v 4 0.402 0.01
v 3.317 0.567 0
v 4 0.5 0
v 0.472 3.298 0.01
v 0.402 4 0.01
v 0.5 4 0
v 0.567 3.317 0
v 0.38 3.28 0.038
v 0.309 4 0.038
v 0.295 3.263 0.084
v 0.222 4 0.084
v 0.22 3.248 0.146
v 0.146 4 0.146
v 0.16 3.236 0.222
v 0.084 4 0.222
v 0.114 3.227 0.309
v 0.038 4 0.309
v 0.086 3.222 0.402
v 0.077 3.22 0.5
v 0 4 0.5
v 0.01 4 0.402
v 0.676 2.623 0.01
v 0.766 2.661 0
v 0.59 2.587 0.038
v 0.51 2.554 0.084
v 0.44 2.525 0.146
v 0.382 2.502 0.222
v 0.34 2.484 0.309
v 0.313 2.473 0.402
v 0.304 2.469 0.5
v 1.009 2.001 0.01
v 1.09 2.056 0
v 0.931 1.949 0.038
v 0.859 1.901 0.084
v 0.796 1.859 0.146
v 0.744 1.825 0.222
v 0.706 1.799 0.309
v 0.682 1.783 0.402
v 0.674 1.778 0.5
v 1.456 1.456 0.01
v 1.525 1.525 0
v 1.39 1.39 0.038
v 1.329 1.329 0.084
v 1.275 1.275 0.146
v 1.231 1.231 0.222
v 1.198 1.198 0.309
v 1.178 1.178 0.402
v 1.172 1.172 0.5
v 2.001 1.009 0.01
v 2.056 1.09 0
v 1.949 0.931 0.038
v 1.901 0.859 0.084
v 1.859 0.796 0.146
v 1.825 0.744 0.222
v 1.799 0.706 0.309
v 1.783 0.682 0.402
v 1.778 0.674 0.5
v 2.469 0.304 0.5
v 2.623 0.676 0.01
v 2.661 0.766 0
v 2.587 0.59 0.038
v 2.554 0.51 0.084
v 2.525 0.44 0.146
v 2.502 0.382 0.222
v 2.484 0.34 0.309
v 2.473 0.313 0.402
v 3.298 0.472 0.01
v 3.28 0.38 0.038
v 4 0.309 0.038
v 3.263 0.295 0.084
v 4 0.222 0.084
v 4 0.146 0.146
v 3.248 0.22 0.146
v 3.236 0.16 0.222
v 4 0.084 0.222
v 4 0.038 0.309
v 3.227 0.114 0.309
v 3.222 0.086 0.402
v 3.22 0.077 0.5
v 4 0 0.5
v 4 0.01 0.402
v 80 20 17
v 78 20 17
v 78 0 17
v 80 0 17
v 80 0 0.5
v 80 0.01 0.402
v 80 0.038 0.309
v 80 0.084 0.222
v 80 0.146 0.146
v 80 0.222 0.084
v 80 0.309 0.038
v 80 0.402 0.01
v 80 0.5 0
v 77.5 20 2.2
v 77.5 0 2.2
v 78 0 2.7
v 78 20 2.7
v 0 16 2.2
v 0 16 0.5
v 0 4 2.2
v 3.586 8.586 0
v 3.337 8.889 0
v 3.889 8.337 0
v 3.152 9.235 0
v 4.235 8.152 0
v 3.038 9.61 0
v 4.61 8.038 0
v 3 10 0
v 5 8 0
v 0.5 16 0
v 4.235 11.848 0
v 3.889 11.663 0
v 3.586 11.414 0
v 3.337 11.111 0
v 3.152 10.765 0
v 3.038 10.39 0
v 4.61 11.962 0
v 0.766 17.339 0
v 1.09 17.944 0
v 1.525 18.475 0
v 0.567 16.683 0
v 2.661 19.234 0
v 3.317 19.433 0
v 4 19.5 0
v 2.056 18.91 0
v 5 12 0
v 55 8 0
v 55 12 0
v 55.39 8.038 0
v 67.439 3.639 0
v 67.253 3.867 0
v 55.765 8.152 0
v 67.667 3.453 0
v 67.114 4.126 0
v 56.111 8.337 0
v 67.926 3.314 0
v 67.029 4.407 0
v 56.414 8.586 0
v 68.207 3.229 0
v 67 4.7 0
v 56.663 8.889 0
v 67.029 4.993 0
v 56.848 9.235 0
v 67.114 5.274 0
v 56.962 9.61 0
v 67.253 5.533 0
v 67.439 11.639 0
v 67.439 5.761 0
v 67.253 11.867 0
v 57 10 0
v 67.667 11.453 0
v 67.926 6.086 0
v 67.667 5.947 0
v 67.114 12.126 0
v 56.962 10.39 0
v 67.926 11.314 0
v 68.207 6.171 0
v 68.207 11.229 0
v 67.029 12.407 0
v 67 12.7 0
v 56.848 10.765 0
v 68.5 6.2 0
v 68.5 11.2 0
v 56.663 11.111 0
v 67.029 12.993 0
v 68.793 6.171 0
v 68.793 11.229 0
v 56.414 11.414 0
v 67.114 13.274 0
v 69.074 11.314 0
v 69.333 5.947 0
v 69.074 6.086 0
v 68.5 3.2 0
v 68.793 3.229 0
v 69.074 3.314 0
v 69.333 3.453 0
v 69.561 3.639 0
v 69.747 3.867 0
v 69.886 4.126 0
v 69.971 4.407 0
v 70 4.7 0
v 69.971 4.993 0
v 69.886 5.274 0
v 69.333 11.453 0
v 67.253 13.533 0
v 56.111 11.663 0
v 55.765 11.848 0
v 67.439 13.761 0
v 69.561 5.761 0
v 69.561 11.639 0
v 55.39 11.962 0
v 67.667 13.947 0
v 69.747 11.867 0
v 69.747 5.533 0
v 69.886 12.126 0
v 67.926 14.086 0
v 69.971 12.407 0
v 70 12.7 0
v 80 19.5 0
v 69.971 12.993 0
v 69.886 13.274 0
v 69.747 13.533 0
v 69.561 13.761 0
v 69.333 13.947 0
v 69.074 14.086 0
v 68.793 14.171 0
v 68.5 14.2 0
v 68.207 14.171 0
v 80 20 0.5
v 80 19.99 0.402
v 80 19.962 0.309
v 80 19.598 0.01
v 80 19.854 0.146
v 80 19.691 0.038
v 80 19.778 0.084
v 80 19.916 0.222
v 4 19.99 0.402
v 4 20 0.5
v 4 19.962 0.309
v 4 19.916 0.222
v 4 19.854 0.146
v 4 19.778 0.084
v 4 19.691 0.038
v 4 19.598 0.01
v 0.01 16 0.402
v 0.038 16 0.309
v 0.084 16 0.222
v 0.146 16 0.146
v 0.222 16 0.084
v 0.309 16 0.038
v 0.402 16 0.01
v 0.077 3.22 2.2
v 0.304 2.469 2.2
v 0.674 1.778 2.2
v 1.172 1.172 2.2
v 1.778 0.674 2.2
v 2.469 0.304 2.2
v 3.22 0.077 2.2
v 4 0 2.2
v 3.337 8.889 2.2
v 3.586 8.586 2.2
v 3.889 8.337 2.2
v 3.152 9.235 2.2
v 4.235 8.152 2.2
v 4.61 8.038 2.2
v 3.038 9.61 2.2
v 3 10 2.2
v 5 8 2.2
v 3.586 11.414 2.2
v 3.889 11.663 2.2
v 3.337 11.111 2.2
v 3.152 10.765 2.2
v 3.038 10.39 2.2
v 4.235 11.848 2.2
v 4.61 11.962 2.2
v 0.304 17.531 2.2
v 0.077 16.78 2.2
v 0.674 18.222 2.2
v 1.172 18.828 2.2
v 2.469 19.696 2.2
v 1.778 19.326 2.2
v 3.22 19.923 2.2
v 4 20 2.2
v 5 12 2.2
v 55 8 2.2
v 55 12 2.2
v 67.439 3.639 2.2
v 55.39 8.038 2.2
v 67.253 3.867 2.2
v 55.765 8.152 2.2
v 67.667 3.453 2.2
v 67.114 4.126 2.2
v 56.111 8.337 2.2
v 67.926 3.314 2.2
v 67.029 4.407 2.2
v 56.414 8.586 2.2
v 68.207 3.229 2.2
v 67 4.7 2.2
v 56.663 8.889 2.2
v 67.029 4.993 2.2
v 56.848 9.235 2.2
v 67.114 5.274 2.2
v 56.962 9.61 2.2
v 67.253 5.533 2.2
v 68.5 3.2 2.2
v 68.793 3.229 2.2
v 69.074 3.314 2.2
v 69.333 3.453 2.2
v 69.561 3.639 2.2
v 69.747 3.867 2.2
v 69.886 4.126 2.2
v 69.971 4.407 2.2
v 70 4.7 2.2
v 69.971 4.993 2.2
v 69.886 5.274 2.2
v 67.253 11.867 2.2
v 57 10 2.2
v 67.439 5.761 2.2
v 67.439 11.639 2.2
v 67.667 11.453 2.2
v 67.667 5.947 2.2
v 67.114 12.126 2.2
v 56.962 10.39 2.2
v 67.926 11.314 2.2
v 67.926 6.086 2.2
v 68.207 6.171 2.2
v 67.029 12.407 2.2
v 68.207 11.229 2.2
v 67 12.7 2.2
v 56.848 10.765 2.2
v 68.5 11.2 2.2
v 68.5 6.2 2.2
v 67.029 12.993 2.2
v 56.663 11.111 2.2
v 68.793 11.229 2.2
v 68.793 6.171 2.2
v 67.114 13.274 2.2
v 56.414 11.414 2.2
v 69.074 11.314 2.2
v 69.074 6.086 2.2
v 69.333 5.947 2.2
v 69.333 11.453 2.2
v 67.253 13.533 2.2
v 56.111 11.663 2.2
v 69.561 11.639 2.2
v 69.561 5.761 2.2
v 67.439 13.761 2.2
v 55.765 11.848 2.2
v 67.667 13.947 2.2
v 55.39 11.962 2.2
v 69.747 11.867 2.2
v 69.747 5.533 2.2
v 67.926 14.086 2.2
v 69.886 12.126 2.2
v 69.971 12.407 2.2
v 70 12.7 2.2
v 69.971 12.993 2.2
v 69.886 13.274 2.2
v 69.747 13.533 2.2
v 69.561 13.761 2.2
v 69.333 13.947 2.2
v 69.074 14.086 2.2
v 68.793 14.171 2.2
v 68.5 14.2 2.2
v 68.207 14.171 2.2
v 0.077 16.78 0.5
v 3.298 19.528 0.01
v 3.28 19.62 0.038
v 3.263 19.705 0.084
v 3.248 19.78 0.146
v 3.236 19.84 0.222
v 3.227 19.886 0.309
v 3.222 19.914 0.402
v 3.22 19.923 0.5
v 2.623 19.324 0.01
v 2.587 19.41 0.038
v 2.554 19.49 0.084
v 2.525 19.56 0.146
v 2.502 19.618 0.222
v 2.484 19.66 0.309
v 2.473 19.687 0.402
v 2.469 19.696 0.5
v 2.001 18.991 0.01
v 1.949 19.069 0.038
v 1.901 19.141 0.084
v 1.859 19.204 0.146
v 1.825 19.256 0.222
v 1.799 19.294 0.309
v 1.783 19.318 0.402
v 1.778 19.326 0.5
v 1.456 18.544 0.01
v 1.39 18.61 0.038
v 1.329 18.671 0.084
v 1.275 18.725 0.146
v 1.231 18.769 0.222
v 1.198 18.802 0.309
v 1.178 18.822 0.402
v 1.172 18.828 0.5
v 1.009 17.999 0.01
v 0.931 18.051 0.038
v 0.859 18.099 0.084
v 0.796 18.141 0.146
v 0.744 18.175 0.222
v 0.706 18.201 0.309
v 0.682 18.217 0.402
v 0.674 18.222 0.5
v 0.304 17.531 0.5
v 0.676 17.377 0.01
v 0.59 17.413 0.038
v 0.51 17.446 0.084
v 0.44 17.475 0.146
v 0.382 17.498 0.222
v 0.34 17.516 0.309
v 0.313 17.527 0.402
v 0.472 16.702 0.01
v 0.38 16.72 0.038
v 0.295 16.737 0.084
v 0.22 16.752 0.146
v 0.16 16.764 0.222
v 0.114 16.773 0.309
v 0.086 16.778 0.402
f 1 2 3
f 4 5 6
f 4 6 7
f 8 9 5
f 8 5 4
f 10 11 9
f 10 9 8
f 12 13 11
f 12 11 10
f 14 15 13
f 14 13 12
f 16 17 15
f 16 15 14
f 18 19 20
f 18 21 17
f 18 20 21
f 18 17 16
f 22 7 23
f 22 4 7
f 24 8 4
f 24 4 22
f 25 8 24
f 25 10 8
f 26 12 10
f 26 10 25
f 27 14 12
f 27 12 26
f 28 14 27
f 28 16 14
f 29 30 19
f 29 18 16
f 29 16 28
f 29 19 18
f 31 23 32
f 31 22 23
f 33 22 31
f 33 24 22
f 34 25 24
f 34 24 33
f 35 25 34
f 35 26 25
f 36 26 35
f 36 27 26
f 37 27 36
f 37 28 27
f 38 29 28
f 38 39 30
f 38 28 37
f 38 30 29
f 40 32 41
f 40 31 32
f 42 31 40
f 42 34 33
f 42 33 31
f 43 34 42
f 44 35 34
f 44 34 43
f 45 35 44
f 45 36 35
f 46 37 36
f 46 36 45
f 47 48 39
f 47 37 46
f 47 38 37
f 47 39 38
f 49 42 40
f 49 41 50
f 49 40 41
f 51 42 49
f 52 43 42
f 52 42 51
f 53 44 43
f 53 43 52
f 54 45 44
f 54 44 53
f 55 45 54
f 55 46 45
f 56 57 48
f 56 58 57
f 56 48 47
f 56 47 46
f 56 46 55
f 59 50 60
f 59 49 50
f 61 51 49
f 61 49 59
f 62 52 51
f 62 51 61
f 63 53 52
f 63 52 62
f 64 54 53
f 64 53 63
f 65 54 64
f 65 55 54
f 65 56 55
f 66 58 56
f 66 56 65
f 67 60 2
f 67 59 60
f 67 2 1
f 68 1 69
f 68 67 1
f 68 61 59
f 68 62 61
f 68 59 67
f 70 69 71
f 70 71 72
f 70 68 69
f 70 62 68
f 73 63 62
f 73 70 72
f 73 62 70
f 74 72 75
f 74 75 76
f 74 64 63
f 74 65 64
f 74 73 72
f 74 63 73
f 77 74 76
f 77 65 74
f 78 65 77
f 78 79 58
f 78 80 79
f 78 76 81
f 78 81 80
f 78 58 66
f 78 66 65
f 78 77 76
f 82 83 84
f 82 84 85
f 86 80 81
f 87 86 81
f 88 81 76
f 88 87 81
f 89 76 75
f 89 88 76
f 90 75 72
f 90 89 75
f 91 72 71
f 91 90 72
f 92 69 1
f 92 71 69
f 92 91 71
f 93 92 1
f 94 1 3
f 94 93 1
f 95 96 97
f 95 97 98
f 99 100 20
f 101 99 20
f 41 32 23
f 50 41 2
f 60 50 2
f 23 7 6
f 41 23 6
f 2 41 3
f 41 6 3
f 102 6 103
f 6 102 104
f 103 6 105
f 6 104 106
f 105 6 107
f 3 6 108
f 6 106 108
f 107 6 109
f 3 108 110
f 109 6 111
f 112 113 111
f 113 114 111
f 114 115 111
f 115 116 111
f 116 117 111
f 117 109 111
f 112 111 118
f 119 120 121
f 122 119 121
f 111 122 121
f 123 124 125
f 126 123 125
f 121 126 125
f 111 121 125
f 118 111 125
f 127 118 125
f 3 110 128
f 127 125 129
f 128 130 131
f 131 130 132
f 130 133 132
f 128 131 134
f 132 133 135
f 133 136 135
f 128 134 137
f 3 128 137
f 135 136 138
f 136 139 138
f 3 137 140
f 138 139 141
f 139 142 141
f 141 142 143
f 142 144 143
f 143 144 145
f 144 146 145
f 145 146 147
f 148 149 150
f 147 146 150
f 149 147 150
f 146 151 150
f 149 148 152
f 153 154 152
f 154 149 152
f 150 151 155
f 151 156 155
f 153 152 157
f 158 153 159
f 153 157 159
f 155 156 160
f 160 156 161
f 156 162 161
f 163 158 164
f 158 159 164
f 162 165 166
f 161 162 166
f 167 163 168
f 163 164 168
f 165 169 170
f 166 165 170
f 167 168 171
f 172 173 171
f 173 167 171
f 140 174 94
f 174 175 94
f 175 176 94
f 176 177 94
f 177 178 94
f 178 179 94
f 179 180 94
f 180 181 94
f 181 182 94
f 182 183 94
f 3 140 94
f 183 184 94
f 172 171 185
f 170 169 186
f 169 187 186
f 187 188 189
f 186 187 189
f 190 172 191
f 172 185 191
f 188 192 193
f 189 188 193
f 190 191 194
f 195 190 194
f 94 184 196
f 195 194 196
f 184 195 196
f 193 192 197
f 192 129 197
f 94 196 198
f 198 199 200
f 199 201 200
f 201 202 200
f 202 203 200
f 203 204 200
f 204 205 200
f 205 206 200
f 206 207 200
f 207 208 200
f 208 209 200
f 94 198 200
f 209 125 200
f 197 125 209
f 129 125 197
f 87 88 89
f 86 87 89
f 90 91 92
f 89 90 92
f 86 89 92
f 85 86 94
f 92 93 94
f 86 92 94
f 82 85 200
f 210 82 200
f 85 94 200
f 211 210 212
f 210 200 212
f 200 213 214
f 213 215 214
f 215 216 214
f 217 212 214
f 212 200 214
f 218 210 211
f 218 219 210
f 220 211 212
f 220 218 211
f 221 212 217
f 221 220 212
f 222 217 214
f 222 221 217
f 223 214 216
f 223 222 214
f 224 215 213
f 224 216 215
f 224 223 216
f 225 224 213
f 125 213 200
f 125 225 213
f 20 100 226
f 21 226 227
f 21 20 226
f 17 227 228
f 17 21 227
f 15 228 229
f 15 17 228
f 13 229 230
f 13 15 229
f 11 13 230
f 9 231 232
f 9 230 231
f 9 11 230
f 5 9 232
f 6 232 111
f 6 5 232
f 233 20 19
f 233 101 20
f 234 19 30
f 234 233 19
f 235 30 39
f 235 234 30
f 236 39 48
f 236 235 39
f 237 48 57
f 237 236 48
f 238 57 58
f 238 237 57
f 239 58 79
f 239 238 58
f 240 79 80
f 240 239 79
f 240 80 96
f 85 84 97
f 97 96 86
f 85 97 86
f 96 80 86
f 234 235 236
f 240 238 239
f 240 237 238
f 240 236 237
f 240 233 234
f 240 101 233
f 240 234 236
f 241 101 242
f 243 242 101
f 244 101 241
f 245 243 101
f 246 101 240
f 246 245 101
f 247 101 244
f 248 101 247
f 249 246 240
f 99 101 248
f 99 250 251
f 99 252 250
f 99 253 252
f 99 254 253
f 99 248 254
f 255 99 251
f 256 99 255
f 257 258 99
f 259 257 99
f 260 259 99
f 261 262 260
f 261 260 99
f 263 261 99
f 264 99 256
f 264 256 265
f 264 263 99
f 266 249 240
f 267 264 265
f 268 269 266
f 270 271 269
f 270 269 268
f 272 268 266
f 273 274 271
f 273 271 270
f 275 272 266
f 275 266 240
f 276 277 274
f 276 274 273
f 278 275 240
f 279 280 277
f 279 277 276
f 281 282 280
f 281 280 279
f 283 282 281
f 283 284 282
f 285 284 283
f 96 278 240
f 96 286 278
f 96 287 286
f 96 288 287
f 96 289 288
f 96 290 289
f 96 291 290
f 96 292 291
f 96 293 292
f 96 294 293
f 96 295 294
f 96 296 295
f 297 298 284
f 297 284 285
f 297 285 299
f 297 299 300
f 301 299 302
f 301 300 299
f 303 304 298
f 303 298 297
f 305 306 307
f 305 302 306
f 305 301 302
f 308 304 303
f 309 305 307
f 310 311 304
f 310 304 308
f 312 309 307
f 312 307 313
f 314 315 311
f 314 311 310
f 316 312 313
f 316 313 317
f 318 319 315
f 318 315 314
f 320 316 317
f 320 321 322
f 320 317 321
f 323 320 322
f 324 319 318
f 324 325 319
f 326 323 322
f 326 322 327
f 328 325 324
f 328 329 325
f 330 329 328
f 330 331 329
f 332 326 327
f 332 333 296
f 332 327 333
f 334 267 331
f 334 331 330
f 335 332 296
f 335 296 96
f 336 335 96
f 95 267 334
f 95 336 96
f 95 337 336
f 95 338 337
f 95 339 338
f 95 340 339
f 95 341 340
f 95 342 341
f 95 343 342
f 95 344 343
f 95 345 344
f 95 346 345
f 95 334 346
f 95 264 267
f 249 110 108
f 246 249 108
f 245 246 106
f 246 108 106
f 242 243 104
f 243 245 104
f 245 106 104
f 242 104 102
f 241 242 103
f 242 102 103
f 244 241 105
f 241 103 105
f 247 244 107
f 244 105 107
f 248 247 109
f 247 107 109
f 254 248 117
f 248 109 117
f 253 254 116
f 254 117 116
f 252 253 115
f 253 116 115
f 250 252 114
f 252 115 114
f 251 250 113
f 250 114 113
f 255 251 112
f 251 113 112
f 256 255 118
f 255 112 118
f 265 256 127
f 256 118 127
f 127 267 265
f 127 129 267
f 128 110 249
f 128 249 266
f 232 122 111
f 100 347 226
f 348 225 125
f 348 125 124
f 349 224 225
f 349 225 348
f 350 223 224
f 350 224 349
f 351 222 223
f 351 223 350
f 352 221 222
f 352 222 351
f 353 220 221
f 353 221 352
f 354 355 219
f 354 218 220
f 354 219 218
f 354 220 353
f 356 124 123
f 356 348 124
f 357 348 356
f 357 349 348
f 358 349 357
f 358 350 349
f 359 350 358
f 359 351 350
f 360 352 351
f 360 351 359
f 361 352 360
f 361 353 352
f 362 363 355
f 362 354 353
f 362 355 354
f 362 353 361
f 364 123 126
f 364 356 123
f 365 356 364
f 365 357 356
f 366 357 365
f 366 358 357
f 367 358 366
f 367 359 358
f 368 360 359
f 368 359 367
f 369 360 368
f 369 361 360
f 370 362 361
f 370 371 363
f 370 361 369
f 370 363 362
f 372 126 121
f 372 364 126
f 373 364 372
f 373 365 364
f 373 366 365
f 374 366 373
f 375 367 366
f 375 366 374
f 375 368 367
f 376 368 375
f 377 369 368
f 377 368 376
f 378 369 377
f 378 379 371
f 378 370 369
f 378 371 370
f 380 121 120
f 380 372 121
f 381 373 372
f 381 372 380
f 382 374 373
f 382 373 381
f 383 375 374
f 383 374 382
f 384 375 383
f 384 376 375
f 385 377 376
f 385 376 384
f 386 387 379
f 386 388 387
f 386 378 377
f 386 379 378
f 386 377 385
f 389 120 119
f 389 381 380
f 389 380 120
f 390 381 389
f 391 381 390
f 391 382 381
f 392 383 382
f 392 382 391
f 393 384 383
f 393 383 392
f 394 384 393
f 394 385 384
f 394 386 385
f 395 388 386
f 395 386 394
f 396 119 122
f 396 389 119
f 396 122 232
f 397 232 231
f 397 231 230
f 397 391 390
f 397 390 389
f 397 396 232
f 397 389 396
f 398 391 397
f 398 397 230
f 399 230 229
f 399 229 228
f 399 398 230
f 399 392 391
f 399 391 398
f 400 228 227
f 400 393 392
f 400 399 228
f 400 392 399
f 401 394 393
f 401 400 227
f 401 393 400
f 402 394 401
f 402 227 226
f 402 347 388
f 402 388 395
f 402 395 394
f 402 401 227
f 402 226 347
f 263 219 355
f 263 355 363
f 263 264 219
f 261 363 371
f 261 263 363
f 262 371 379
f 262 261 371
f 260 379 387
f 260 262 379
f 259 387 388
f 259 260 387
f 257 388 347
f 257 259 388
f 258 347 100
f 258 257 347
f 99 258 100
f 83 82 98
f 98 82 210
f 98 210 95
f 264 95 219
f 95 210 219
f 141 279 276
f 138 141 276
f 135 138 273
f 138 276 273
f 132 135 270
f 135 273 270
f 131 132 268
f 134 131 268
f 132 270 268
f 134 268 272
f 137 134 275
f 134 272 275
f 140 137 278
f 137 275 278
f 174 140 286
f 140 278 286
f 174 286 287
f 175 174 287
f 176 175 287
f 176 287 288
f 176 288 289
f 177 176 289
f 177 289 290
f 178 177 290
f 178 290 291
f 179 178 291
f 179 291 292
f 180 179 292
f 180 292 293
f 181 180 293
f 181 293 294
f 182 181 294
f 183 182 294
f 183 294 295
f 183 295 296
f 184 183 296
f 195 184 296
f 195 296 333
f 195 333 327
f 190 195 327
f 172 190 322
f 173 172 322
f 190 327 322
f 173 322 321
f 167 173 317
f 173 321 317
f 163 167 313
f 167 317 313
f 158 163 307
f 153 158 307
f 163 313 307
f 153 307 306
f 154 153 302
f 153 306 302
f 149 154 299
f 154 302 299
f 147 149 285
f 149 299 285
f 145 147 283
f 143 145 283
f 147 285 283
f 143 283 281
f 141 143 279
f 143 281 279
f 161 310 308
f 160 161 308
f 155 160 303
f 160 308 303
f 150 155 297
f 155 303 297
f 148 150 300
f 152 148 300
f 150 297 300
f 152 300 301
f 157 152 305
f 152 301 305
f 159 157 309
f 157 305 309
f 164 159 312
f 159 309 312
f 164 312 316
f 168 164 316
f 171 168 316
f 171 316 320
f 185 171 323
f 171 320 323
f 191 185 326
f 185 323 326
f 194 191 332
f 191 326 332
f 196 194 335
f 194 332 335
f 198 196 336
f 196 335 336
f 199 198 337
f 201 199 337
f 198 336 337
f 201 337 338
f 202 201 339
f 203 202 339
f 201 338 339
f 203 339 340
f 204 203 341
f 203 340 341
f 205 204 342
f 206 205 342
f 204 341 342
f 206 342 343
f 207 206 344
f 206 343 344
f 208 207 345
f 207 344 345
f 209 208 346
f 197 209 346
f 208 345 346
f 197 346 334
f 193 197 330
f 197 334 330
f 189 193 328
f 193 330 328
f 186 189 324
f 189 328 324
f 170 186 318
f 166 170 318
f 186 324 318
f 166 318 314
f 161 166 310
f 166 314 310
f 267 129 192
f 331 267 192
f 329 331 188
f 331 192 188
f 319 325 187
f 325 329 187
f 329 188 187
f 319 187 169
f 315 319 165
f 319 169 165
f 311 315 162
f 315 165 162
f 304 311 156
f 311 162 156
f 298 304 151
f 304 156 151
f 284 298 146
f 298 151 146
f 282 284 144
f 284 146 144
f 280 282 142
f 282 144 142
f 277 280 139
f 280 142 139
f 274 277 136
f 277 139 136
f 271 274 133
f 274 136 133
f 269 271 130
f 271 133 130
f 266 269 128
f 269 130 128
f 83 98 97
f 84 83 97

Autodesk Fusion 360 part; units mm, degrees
sketch "Sketch1" plane through (0, 0, 0) normal (0, 0, 1) x (1, 0, 0)
  line L0 (0, 0) -> (80, 0)
  line L1 (80, 0) -> (80, 20)
  line L2 (80, 20) -> (0, 20)
  line L3 (0, 20) -> (0, 0)
  line L4 (80, 20) -> (60, 20)
  line L5 (60, 20) -> (60, 0)
  line L6 (60, 0) -> (80, 0)
  line L7 (80, 0) -> (80, 20)
  line L8 (80, 20) -> (78, 20)
  line L9 (78, 20) -> (78, 0)
  line L10 (78, 0) -> (80, 0)
  line L11 (80, 0) -> (80, 20)
  line L12 (55, 12) -> (5, 12)
  arc A0 (5, 12) -> (5, 8) centre (5, 10) ccw
  line L13 (5, 8) -> (55, 8)
  arc A1 (55, 8) -> (55, 12) centre (55, 10) ccw
  line L14 (55, 10) -> (5, 10) construction
  point P0 (30, 10)
  dimension "d1" = 80
  dimension "d2" = 20
  dimension "d3" = 20
  dimension "d4" = 2
  dimension "d6" = 4
extrude "Extrude1" add sketch "Sketch1" along normal blind 2.2 contours L0 L2 L3 L5 | L0 L2 L4 L5 L6 L9
extrude "Extrude2" add sketch "Sketch1" along normal blind 15 contours L0 L1 L2 L4 L6 L7 L8 L9 L10 L11
chamfer "Chamfer1" distance 0.5 angle 45 1 edges at (78, 10, 2.2)
fillet "Fillet1" radius 4 2 edges at (0, 0, 1.1) (0, 20, 1.1)
fillet "Fillet2" radius 0.5 5 edges at (42, 20, 0) (1.1716, 18.8284, 0) (0, 10, 0) (1.1716, 1.1716, 0) (42, 0, 0)
sketch "Sketch2" plane through (0, 0, 2.2) normal (0, 0, 1) x (-1, 0, 0)
  arc A0 (-4, -20) -> (0, -16) centre (-4, -16) ccw
  line L0 (0, -16) -> (0, -4)
  arc A1 (0, -4) -> (-4, 0) centre (-4, -4) ccw
  line L1 (-4, 0) -> (-77.5, 0)
  line L2 (-77.5, 0) -> (-77.5, -20)
  line L3 (-77.5, -20) -> (-4, -20)
  arc A2 (-55, -8) -> (-55, -12) centre (-55, -10) ccw
  line L4 (-55, -8) -> (-5, -8)
  arc A3 (-5, -12) -> (-5, -8) centre (-5, -10) ccw
  line L5 (-5, -12) -> (-55, -12)
  line L6 (-77.5, 0) -> (-59.5, 0)
  line L7 (-59.5, 0) -> (-59.5, -20)
  line L8 (-59.5, -20) -> (-77.5, -20)
  line L9 (-77.5, -20) -> (-77.5, 0)
  circle A4 centre (-68.5, -4.7) radius 1.5
  circle A5 centre (-68.5, -12.7) radius 1.5
  dimension "d14" = 18
  dimension "d15" = 3
  dimension "d16" = 9
  dimension "d17" = 20
  dimension "d18" = 4.7
  dimension "d19" = 3
  dimension "d20" = 8
extrude "Extrude3" cut sketch "Sketch2" against normal blind 10 contours A4 | A5
extrude "Extrude4" add 1 faces at (78.6667, 13.3333, 15) along direction (0, 0, 1) blind 2
